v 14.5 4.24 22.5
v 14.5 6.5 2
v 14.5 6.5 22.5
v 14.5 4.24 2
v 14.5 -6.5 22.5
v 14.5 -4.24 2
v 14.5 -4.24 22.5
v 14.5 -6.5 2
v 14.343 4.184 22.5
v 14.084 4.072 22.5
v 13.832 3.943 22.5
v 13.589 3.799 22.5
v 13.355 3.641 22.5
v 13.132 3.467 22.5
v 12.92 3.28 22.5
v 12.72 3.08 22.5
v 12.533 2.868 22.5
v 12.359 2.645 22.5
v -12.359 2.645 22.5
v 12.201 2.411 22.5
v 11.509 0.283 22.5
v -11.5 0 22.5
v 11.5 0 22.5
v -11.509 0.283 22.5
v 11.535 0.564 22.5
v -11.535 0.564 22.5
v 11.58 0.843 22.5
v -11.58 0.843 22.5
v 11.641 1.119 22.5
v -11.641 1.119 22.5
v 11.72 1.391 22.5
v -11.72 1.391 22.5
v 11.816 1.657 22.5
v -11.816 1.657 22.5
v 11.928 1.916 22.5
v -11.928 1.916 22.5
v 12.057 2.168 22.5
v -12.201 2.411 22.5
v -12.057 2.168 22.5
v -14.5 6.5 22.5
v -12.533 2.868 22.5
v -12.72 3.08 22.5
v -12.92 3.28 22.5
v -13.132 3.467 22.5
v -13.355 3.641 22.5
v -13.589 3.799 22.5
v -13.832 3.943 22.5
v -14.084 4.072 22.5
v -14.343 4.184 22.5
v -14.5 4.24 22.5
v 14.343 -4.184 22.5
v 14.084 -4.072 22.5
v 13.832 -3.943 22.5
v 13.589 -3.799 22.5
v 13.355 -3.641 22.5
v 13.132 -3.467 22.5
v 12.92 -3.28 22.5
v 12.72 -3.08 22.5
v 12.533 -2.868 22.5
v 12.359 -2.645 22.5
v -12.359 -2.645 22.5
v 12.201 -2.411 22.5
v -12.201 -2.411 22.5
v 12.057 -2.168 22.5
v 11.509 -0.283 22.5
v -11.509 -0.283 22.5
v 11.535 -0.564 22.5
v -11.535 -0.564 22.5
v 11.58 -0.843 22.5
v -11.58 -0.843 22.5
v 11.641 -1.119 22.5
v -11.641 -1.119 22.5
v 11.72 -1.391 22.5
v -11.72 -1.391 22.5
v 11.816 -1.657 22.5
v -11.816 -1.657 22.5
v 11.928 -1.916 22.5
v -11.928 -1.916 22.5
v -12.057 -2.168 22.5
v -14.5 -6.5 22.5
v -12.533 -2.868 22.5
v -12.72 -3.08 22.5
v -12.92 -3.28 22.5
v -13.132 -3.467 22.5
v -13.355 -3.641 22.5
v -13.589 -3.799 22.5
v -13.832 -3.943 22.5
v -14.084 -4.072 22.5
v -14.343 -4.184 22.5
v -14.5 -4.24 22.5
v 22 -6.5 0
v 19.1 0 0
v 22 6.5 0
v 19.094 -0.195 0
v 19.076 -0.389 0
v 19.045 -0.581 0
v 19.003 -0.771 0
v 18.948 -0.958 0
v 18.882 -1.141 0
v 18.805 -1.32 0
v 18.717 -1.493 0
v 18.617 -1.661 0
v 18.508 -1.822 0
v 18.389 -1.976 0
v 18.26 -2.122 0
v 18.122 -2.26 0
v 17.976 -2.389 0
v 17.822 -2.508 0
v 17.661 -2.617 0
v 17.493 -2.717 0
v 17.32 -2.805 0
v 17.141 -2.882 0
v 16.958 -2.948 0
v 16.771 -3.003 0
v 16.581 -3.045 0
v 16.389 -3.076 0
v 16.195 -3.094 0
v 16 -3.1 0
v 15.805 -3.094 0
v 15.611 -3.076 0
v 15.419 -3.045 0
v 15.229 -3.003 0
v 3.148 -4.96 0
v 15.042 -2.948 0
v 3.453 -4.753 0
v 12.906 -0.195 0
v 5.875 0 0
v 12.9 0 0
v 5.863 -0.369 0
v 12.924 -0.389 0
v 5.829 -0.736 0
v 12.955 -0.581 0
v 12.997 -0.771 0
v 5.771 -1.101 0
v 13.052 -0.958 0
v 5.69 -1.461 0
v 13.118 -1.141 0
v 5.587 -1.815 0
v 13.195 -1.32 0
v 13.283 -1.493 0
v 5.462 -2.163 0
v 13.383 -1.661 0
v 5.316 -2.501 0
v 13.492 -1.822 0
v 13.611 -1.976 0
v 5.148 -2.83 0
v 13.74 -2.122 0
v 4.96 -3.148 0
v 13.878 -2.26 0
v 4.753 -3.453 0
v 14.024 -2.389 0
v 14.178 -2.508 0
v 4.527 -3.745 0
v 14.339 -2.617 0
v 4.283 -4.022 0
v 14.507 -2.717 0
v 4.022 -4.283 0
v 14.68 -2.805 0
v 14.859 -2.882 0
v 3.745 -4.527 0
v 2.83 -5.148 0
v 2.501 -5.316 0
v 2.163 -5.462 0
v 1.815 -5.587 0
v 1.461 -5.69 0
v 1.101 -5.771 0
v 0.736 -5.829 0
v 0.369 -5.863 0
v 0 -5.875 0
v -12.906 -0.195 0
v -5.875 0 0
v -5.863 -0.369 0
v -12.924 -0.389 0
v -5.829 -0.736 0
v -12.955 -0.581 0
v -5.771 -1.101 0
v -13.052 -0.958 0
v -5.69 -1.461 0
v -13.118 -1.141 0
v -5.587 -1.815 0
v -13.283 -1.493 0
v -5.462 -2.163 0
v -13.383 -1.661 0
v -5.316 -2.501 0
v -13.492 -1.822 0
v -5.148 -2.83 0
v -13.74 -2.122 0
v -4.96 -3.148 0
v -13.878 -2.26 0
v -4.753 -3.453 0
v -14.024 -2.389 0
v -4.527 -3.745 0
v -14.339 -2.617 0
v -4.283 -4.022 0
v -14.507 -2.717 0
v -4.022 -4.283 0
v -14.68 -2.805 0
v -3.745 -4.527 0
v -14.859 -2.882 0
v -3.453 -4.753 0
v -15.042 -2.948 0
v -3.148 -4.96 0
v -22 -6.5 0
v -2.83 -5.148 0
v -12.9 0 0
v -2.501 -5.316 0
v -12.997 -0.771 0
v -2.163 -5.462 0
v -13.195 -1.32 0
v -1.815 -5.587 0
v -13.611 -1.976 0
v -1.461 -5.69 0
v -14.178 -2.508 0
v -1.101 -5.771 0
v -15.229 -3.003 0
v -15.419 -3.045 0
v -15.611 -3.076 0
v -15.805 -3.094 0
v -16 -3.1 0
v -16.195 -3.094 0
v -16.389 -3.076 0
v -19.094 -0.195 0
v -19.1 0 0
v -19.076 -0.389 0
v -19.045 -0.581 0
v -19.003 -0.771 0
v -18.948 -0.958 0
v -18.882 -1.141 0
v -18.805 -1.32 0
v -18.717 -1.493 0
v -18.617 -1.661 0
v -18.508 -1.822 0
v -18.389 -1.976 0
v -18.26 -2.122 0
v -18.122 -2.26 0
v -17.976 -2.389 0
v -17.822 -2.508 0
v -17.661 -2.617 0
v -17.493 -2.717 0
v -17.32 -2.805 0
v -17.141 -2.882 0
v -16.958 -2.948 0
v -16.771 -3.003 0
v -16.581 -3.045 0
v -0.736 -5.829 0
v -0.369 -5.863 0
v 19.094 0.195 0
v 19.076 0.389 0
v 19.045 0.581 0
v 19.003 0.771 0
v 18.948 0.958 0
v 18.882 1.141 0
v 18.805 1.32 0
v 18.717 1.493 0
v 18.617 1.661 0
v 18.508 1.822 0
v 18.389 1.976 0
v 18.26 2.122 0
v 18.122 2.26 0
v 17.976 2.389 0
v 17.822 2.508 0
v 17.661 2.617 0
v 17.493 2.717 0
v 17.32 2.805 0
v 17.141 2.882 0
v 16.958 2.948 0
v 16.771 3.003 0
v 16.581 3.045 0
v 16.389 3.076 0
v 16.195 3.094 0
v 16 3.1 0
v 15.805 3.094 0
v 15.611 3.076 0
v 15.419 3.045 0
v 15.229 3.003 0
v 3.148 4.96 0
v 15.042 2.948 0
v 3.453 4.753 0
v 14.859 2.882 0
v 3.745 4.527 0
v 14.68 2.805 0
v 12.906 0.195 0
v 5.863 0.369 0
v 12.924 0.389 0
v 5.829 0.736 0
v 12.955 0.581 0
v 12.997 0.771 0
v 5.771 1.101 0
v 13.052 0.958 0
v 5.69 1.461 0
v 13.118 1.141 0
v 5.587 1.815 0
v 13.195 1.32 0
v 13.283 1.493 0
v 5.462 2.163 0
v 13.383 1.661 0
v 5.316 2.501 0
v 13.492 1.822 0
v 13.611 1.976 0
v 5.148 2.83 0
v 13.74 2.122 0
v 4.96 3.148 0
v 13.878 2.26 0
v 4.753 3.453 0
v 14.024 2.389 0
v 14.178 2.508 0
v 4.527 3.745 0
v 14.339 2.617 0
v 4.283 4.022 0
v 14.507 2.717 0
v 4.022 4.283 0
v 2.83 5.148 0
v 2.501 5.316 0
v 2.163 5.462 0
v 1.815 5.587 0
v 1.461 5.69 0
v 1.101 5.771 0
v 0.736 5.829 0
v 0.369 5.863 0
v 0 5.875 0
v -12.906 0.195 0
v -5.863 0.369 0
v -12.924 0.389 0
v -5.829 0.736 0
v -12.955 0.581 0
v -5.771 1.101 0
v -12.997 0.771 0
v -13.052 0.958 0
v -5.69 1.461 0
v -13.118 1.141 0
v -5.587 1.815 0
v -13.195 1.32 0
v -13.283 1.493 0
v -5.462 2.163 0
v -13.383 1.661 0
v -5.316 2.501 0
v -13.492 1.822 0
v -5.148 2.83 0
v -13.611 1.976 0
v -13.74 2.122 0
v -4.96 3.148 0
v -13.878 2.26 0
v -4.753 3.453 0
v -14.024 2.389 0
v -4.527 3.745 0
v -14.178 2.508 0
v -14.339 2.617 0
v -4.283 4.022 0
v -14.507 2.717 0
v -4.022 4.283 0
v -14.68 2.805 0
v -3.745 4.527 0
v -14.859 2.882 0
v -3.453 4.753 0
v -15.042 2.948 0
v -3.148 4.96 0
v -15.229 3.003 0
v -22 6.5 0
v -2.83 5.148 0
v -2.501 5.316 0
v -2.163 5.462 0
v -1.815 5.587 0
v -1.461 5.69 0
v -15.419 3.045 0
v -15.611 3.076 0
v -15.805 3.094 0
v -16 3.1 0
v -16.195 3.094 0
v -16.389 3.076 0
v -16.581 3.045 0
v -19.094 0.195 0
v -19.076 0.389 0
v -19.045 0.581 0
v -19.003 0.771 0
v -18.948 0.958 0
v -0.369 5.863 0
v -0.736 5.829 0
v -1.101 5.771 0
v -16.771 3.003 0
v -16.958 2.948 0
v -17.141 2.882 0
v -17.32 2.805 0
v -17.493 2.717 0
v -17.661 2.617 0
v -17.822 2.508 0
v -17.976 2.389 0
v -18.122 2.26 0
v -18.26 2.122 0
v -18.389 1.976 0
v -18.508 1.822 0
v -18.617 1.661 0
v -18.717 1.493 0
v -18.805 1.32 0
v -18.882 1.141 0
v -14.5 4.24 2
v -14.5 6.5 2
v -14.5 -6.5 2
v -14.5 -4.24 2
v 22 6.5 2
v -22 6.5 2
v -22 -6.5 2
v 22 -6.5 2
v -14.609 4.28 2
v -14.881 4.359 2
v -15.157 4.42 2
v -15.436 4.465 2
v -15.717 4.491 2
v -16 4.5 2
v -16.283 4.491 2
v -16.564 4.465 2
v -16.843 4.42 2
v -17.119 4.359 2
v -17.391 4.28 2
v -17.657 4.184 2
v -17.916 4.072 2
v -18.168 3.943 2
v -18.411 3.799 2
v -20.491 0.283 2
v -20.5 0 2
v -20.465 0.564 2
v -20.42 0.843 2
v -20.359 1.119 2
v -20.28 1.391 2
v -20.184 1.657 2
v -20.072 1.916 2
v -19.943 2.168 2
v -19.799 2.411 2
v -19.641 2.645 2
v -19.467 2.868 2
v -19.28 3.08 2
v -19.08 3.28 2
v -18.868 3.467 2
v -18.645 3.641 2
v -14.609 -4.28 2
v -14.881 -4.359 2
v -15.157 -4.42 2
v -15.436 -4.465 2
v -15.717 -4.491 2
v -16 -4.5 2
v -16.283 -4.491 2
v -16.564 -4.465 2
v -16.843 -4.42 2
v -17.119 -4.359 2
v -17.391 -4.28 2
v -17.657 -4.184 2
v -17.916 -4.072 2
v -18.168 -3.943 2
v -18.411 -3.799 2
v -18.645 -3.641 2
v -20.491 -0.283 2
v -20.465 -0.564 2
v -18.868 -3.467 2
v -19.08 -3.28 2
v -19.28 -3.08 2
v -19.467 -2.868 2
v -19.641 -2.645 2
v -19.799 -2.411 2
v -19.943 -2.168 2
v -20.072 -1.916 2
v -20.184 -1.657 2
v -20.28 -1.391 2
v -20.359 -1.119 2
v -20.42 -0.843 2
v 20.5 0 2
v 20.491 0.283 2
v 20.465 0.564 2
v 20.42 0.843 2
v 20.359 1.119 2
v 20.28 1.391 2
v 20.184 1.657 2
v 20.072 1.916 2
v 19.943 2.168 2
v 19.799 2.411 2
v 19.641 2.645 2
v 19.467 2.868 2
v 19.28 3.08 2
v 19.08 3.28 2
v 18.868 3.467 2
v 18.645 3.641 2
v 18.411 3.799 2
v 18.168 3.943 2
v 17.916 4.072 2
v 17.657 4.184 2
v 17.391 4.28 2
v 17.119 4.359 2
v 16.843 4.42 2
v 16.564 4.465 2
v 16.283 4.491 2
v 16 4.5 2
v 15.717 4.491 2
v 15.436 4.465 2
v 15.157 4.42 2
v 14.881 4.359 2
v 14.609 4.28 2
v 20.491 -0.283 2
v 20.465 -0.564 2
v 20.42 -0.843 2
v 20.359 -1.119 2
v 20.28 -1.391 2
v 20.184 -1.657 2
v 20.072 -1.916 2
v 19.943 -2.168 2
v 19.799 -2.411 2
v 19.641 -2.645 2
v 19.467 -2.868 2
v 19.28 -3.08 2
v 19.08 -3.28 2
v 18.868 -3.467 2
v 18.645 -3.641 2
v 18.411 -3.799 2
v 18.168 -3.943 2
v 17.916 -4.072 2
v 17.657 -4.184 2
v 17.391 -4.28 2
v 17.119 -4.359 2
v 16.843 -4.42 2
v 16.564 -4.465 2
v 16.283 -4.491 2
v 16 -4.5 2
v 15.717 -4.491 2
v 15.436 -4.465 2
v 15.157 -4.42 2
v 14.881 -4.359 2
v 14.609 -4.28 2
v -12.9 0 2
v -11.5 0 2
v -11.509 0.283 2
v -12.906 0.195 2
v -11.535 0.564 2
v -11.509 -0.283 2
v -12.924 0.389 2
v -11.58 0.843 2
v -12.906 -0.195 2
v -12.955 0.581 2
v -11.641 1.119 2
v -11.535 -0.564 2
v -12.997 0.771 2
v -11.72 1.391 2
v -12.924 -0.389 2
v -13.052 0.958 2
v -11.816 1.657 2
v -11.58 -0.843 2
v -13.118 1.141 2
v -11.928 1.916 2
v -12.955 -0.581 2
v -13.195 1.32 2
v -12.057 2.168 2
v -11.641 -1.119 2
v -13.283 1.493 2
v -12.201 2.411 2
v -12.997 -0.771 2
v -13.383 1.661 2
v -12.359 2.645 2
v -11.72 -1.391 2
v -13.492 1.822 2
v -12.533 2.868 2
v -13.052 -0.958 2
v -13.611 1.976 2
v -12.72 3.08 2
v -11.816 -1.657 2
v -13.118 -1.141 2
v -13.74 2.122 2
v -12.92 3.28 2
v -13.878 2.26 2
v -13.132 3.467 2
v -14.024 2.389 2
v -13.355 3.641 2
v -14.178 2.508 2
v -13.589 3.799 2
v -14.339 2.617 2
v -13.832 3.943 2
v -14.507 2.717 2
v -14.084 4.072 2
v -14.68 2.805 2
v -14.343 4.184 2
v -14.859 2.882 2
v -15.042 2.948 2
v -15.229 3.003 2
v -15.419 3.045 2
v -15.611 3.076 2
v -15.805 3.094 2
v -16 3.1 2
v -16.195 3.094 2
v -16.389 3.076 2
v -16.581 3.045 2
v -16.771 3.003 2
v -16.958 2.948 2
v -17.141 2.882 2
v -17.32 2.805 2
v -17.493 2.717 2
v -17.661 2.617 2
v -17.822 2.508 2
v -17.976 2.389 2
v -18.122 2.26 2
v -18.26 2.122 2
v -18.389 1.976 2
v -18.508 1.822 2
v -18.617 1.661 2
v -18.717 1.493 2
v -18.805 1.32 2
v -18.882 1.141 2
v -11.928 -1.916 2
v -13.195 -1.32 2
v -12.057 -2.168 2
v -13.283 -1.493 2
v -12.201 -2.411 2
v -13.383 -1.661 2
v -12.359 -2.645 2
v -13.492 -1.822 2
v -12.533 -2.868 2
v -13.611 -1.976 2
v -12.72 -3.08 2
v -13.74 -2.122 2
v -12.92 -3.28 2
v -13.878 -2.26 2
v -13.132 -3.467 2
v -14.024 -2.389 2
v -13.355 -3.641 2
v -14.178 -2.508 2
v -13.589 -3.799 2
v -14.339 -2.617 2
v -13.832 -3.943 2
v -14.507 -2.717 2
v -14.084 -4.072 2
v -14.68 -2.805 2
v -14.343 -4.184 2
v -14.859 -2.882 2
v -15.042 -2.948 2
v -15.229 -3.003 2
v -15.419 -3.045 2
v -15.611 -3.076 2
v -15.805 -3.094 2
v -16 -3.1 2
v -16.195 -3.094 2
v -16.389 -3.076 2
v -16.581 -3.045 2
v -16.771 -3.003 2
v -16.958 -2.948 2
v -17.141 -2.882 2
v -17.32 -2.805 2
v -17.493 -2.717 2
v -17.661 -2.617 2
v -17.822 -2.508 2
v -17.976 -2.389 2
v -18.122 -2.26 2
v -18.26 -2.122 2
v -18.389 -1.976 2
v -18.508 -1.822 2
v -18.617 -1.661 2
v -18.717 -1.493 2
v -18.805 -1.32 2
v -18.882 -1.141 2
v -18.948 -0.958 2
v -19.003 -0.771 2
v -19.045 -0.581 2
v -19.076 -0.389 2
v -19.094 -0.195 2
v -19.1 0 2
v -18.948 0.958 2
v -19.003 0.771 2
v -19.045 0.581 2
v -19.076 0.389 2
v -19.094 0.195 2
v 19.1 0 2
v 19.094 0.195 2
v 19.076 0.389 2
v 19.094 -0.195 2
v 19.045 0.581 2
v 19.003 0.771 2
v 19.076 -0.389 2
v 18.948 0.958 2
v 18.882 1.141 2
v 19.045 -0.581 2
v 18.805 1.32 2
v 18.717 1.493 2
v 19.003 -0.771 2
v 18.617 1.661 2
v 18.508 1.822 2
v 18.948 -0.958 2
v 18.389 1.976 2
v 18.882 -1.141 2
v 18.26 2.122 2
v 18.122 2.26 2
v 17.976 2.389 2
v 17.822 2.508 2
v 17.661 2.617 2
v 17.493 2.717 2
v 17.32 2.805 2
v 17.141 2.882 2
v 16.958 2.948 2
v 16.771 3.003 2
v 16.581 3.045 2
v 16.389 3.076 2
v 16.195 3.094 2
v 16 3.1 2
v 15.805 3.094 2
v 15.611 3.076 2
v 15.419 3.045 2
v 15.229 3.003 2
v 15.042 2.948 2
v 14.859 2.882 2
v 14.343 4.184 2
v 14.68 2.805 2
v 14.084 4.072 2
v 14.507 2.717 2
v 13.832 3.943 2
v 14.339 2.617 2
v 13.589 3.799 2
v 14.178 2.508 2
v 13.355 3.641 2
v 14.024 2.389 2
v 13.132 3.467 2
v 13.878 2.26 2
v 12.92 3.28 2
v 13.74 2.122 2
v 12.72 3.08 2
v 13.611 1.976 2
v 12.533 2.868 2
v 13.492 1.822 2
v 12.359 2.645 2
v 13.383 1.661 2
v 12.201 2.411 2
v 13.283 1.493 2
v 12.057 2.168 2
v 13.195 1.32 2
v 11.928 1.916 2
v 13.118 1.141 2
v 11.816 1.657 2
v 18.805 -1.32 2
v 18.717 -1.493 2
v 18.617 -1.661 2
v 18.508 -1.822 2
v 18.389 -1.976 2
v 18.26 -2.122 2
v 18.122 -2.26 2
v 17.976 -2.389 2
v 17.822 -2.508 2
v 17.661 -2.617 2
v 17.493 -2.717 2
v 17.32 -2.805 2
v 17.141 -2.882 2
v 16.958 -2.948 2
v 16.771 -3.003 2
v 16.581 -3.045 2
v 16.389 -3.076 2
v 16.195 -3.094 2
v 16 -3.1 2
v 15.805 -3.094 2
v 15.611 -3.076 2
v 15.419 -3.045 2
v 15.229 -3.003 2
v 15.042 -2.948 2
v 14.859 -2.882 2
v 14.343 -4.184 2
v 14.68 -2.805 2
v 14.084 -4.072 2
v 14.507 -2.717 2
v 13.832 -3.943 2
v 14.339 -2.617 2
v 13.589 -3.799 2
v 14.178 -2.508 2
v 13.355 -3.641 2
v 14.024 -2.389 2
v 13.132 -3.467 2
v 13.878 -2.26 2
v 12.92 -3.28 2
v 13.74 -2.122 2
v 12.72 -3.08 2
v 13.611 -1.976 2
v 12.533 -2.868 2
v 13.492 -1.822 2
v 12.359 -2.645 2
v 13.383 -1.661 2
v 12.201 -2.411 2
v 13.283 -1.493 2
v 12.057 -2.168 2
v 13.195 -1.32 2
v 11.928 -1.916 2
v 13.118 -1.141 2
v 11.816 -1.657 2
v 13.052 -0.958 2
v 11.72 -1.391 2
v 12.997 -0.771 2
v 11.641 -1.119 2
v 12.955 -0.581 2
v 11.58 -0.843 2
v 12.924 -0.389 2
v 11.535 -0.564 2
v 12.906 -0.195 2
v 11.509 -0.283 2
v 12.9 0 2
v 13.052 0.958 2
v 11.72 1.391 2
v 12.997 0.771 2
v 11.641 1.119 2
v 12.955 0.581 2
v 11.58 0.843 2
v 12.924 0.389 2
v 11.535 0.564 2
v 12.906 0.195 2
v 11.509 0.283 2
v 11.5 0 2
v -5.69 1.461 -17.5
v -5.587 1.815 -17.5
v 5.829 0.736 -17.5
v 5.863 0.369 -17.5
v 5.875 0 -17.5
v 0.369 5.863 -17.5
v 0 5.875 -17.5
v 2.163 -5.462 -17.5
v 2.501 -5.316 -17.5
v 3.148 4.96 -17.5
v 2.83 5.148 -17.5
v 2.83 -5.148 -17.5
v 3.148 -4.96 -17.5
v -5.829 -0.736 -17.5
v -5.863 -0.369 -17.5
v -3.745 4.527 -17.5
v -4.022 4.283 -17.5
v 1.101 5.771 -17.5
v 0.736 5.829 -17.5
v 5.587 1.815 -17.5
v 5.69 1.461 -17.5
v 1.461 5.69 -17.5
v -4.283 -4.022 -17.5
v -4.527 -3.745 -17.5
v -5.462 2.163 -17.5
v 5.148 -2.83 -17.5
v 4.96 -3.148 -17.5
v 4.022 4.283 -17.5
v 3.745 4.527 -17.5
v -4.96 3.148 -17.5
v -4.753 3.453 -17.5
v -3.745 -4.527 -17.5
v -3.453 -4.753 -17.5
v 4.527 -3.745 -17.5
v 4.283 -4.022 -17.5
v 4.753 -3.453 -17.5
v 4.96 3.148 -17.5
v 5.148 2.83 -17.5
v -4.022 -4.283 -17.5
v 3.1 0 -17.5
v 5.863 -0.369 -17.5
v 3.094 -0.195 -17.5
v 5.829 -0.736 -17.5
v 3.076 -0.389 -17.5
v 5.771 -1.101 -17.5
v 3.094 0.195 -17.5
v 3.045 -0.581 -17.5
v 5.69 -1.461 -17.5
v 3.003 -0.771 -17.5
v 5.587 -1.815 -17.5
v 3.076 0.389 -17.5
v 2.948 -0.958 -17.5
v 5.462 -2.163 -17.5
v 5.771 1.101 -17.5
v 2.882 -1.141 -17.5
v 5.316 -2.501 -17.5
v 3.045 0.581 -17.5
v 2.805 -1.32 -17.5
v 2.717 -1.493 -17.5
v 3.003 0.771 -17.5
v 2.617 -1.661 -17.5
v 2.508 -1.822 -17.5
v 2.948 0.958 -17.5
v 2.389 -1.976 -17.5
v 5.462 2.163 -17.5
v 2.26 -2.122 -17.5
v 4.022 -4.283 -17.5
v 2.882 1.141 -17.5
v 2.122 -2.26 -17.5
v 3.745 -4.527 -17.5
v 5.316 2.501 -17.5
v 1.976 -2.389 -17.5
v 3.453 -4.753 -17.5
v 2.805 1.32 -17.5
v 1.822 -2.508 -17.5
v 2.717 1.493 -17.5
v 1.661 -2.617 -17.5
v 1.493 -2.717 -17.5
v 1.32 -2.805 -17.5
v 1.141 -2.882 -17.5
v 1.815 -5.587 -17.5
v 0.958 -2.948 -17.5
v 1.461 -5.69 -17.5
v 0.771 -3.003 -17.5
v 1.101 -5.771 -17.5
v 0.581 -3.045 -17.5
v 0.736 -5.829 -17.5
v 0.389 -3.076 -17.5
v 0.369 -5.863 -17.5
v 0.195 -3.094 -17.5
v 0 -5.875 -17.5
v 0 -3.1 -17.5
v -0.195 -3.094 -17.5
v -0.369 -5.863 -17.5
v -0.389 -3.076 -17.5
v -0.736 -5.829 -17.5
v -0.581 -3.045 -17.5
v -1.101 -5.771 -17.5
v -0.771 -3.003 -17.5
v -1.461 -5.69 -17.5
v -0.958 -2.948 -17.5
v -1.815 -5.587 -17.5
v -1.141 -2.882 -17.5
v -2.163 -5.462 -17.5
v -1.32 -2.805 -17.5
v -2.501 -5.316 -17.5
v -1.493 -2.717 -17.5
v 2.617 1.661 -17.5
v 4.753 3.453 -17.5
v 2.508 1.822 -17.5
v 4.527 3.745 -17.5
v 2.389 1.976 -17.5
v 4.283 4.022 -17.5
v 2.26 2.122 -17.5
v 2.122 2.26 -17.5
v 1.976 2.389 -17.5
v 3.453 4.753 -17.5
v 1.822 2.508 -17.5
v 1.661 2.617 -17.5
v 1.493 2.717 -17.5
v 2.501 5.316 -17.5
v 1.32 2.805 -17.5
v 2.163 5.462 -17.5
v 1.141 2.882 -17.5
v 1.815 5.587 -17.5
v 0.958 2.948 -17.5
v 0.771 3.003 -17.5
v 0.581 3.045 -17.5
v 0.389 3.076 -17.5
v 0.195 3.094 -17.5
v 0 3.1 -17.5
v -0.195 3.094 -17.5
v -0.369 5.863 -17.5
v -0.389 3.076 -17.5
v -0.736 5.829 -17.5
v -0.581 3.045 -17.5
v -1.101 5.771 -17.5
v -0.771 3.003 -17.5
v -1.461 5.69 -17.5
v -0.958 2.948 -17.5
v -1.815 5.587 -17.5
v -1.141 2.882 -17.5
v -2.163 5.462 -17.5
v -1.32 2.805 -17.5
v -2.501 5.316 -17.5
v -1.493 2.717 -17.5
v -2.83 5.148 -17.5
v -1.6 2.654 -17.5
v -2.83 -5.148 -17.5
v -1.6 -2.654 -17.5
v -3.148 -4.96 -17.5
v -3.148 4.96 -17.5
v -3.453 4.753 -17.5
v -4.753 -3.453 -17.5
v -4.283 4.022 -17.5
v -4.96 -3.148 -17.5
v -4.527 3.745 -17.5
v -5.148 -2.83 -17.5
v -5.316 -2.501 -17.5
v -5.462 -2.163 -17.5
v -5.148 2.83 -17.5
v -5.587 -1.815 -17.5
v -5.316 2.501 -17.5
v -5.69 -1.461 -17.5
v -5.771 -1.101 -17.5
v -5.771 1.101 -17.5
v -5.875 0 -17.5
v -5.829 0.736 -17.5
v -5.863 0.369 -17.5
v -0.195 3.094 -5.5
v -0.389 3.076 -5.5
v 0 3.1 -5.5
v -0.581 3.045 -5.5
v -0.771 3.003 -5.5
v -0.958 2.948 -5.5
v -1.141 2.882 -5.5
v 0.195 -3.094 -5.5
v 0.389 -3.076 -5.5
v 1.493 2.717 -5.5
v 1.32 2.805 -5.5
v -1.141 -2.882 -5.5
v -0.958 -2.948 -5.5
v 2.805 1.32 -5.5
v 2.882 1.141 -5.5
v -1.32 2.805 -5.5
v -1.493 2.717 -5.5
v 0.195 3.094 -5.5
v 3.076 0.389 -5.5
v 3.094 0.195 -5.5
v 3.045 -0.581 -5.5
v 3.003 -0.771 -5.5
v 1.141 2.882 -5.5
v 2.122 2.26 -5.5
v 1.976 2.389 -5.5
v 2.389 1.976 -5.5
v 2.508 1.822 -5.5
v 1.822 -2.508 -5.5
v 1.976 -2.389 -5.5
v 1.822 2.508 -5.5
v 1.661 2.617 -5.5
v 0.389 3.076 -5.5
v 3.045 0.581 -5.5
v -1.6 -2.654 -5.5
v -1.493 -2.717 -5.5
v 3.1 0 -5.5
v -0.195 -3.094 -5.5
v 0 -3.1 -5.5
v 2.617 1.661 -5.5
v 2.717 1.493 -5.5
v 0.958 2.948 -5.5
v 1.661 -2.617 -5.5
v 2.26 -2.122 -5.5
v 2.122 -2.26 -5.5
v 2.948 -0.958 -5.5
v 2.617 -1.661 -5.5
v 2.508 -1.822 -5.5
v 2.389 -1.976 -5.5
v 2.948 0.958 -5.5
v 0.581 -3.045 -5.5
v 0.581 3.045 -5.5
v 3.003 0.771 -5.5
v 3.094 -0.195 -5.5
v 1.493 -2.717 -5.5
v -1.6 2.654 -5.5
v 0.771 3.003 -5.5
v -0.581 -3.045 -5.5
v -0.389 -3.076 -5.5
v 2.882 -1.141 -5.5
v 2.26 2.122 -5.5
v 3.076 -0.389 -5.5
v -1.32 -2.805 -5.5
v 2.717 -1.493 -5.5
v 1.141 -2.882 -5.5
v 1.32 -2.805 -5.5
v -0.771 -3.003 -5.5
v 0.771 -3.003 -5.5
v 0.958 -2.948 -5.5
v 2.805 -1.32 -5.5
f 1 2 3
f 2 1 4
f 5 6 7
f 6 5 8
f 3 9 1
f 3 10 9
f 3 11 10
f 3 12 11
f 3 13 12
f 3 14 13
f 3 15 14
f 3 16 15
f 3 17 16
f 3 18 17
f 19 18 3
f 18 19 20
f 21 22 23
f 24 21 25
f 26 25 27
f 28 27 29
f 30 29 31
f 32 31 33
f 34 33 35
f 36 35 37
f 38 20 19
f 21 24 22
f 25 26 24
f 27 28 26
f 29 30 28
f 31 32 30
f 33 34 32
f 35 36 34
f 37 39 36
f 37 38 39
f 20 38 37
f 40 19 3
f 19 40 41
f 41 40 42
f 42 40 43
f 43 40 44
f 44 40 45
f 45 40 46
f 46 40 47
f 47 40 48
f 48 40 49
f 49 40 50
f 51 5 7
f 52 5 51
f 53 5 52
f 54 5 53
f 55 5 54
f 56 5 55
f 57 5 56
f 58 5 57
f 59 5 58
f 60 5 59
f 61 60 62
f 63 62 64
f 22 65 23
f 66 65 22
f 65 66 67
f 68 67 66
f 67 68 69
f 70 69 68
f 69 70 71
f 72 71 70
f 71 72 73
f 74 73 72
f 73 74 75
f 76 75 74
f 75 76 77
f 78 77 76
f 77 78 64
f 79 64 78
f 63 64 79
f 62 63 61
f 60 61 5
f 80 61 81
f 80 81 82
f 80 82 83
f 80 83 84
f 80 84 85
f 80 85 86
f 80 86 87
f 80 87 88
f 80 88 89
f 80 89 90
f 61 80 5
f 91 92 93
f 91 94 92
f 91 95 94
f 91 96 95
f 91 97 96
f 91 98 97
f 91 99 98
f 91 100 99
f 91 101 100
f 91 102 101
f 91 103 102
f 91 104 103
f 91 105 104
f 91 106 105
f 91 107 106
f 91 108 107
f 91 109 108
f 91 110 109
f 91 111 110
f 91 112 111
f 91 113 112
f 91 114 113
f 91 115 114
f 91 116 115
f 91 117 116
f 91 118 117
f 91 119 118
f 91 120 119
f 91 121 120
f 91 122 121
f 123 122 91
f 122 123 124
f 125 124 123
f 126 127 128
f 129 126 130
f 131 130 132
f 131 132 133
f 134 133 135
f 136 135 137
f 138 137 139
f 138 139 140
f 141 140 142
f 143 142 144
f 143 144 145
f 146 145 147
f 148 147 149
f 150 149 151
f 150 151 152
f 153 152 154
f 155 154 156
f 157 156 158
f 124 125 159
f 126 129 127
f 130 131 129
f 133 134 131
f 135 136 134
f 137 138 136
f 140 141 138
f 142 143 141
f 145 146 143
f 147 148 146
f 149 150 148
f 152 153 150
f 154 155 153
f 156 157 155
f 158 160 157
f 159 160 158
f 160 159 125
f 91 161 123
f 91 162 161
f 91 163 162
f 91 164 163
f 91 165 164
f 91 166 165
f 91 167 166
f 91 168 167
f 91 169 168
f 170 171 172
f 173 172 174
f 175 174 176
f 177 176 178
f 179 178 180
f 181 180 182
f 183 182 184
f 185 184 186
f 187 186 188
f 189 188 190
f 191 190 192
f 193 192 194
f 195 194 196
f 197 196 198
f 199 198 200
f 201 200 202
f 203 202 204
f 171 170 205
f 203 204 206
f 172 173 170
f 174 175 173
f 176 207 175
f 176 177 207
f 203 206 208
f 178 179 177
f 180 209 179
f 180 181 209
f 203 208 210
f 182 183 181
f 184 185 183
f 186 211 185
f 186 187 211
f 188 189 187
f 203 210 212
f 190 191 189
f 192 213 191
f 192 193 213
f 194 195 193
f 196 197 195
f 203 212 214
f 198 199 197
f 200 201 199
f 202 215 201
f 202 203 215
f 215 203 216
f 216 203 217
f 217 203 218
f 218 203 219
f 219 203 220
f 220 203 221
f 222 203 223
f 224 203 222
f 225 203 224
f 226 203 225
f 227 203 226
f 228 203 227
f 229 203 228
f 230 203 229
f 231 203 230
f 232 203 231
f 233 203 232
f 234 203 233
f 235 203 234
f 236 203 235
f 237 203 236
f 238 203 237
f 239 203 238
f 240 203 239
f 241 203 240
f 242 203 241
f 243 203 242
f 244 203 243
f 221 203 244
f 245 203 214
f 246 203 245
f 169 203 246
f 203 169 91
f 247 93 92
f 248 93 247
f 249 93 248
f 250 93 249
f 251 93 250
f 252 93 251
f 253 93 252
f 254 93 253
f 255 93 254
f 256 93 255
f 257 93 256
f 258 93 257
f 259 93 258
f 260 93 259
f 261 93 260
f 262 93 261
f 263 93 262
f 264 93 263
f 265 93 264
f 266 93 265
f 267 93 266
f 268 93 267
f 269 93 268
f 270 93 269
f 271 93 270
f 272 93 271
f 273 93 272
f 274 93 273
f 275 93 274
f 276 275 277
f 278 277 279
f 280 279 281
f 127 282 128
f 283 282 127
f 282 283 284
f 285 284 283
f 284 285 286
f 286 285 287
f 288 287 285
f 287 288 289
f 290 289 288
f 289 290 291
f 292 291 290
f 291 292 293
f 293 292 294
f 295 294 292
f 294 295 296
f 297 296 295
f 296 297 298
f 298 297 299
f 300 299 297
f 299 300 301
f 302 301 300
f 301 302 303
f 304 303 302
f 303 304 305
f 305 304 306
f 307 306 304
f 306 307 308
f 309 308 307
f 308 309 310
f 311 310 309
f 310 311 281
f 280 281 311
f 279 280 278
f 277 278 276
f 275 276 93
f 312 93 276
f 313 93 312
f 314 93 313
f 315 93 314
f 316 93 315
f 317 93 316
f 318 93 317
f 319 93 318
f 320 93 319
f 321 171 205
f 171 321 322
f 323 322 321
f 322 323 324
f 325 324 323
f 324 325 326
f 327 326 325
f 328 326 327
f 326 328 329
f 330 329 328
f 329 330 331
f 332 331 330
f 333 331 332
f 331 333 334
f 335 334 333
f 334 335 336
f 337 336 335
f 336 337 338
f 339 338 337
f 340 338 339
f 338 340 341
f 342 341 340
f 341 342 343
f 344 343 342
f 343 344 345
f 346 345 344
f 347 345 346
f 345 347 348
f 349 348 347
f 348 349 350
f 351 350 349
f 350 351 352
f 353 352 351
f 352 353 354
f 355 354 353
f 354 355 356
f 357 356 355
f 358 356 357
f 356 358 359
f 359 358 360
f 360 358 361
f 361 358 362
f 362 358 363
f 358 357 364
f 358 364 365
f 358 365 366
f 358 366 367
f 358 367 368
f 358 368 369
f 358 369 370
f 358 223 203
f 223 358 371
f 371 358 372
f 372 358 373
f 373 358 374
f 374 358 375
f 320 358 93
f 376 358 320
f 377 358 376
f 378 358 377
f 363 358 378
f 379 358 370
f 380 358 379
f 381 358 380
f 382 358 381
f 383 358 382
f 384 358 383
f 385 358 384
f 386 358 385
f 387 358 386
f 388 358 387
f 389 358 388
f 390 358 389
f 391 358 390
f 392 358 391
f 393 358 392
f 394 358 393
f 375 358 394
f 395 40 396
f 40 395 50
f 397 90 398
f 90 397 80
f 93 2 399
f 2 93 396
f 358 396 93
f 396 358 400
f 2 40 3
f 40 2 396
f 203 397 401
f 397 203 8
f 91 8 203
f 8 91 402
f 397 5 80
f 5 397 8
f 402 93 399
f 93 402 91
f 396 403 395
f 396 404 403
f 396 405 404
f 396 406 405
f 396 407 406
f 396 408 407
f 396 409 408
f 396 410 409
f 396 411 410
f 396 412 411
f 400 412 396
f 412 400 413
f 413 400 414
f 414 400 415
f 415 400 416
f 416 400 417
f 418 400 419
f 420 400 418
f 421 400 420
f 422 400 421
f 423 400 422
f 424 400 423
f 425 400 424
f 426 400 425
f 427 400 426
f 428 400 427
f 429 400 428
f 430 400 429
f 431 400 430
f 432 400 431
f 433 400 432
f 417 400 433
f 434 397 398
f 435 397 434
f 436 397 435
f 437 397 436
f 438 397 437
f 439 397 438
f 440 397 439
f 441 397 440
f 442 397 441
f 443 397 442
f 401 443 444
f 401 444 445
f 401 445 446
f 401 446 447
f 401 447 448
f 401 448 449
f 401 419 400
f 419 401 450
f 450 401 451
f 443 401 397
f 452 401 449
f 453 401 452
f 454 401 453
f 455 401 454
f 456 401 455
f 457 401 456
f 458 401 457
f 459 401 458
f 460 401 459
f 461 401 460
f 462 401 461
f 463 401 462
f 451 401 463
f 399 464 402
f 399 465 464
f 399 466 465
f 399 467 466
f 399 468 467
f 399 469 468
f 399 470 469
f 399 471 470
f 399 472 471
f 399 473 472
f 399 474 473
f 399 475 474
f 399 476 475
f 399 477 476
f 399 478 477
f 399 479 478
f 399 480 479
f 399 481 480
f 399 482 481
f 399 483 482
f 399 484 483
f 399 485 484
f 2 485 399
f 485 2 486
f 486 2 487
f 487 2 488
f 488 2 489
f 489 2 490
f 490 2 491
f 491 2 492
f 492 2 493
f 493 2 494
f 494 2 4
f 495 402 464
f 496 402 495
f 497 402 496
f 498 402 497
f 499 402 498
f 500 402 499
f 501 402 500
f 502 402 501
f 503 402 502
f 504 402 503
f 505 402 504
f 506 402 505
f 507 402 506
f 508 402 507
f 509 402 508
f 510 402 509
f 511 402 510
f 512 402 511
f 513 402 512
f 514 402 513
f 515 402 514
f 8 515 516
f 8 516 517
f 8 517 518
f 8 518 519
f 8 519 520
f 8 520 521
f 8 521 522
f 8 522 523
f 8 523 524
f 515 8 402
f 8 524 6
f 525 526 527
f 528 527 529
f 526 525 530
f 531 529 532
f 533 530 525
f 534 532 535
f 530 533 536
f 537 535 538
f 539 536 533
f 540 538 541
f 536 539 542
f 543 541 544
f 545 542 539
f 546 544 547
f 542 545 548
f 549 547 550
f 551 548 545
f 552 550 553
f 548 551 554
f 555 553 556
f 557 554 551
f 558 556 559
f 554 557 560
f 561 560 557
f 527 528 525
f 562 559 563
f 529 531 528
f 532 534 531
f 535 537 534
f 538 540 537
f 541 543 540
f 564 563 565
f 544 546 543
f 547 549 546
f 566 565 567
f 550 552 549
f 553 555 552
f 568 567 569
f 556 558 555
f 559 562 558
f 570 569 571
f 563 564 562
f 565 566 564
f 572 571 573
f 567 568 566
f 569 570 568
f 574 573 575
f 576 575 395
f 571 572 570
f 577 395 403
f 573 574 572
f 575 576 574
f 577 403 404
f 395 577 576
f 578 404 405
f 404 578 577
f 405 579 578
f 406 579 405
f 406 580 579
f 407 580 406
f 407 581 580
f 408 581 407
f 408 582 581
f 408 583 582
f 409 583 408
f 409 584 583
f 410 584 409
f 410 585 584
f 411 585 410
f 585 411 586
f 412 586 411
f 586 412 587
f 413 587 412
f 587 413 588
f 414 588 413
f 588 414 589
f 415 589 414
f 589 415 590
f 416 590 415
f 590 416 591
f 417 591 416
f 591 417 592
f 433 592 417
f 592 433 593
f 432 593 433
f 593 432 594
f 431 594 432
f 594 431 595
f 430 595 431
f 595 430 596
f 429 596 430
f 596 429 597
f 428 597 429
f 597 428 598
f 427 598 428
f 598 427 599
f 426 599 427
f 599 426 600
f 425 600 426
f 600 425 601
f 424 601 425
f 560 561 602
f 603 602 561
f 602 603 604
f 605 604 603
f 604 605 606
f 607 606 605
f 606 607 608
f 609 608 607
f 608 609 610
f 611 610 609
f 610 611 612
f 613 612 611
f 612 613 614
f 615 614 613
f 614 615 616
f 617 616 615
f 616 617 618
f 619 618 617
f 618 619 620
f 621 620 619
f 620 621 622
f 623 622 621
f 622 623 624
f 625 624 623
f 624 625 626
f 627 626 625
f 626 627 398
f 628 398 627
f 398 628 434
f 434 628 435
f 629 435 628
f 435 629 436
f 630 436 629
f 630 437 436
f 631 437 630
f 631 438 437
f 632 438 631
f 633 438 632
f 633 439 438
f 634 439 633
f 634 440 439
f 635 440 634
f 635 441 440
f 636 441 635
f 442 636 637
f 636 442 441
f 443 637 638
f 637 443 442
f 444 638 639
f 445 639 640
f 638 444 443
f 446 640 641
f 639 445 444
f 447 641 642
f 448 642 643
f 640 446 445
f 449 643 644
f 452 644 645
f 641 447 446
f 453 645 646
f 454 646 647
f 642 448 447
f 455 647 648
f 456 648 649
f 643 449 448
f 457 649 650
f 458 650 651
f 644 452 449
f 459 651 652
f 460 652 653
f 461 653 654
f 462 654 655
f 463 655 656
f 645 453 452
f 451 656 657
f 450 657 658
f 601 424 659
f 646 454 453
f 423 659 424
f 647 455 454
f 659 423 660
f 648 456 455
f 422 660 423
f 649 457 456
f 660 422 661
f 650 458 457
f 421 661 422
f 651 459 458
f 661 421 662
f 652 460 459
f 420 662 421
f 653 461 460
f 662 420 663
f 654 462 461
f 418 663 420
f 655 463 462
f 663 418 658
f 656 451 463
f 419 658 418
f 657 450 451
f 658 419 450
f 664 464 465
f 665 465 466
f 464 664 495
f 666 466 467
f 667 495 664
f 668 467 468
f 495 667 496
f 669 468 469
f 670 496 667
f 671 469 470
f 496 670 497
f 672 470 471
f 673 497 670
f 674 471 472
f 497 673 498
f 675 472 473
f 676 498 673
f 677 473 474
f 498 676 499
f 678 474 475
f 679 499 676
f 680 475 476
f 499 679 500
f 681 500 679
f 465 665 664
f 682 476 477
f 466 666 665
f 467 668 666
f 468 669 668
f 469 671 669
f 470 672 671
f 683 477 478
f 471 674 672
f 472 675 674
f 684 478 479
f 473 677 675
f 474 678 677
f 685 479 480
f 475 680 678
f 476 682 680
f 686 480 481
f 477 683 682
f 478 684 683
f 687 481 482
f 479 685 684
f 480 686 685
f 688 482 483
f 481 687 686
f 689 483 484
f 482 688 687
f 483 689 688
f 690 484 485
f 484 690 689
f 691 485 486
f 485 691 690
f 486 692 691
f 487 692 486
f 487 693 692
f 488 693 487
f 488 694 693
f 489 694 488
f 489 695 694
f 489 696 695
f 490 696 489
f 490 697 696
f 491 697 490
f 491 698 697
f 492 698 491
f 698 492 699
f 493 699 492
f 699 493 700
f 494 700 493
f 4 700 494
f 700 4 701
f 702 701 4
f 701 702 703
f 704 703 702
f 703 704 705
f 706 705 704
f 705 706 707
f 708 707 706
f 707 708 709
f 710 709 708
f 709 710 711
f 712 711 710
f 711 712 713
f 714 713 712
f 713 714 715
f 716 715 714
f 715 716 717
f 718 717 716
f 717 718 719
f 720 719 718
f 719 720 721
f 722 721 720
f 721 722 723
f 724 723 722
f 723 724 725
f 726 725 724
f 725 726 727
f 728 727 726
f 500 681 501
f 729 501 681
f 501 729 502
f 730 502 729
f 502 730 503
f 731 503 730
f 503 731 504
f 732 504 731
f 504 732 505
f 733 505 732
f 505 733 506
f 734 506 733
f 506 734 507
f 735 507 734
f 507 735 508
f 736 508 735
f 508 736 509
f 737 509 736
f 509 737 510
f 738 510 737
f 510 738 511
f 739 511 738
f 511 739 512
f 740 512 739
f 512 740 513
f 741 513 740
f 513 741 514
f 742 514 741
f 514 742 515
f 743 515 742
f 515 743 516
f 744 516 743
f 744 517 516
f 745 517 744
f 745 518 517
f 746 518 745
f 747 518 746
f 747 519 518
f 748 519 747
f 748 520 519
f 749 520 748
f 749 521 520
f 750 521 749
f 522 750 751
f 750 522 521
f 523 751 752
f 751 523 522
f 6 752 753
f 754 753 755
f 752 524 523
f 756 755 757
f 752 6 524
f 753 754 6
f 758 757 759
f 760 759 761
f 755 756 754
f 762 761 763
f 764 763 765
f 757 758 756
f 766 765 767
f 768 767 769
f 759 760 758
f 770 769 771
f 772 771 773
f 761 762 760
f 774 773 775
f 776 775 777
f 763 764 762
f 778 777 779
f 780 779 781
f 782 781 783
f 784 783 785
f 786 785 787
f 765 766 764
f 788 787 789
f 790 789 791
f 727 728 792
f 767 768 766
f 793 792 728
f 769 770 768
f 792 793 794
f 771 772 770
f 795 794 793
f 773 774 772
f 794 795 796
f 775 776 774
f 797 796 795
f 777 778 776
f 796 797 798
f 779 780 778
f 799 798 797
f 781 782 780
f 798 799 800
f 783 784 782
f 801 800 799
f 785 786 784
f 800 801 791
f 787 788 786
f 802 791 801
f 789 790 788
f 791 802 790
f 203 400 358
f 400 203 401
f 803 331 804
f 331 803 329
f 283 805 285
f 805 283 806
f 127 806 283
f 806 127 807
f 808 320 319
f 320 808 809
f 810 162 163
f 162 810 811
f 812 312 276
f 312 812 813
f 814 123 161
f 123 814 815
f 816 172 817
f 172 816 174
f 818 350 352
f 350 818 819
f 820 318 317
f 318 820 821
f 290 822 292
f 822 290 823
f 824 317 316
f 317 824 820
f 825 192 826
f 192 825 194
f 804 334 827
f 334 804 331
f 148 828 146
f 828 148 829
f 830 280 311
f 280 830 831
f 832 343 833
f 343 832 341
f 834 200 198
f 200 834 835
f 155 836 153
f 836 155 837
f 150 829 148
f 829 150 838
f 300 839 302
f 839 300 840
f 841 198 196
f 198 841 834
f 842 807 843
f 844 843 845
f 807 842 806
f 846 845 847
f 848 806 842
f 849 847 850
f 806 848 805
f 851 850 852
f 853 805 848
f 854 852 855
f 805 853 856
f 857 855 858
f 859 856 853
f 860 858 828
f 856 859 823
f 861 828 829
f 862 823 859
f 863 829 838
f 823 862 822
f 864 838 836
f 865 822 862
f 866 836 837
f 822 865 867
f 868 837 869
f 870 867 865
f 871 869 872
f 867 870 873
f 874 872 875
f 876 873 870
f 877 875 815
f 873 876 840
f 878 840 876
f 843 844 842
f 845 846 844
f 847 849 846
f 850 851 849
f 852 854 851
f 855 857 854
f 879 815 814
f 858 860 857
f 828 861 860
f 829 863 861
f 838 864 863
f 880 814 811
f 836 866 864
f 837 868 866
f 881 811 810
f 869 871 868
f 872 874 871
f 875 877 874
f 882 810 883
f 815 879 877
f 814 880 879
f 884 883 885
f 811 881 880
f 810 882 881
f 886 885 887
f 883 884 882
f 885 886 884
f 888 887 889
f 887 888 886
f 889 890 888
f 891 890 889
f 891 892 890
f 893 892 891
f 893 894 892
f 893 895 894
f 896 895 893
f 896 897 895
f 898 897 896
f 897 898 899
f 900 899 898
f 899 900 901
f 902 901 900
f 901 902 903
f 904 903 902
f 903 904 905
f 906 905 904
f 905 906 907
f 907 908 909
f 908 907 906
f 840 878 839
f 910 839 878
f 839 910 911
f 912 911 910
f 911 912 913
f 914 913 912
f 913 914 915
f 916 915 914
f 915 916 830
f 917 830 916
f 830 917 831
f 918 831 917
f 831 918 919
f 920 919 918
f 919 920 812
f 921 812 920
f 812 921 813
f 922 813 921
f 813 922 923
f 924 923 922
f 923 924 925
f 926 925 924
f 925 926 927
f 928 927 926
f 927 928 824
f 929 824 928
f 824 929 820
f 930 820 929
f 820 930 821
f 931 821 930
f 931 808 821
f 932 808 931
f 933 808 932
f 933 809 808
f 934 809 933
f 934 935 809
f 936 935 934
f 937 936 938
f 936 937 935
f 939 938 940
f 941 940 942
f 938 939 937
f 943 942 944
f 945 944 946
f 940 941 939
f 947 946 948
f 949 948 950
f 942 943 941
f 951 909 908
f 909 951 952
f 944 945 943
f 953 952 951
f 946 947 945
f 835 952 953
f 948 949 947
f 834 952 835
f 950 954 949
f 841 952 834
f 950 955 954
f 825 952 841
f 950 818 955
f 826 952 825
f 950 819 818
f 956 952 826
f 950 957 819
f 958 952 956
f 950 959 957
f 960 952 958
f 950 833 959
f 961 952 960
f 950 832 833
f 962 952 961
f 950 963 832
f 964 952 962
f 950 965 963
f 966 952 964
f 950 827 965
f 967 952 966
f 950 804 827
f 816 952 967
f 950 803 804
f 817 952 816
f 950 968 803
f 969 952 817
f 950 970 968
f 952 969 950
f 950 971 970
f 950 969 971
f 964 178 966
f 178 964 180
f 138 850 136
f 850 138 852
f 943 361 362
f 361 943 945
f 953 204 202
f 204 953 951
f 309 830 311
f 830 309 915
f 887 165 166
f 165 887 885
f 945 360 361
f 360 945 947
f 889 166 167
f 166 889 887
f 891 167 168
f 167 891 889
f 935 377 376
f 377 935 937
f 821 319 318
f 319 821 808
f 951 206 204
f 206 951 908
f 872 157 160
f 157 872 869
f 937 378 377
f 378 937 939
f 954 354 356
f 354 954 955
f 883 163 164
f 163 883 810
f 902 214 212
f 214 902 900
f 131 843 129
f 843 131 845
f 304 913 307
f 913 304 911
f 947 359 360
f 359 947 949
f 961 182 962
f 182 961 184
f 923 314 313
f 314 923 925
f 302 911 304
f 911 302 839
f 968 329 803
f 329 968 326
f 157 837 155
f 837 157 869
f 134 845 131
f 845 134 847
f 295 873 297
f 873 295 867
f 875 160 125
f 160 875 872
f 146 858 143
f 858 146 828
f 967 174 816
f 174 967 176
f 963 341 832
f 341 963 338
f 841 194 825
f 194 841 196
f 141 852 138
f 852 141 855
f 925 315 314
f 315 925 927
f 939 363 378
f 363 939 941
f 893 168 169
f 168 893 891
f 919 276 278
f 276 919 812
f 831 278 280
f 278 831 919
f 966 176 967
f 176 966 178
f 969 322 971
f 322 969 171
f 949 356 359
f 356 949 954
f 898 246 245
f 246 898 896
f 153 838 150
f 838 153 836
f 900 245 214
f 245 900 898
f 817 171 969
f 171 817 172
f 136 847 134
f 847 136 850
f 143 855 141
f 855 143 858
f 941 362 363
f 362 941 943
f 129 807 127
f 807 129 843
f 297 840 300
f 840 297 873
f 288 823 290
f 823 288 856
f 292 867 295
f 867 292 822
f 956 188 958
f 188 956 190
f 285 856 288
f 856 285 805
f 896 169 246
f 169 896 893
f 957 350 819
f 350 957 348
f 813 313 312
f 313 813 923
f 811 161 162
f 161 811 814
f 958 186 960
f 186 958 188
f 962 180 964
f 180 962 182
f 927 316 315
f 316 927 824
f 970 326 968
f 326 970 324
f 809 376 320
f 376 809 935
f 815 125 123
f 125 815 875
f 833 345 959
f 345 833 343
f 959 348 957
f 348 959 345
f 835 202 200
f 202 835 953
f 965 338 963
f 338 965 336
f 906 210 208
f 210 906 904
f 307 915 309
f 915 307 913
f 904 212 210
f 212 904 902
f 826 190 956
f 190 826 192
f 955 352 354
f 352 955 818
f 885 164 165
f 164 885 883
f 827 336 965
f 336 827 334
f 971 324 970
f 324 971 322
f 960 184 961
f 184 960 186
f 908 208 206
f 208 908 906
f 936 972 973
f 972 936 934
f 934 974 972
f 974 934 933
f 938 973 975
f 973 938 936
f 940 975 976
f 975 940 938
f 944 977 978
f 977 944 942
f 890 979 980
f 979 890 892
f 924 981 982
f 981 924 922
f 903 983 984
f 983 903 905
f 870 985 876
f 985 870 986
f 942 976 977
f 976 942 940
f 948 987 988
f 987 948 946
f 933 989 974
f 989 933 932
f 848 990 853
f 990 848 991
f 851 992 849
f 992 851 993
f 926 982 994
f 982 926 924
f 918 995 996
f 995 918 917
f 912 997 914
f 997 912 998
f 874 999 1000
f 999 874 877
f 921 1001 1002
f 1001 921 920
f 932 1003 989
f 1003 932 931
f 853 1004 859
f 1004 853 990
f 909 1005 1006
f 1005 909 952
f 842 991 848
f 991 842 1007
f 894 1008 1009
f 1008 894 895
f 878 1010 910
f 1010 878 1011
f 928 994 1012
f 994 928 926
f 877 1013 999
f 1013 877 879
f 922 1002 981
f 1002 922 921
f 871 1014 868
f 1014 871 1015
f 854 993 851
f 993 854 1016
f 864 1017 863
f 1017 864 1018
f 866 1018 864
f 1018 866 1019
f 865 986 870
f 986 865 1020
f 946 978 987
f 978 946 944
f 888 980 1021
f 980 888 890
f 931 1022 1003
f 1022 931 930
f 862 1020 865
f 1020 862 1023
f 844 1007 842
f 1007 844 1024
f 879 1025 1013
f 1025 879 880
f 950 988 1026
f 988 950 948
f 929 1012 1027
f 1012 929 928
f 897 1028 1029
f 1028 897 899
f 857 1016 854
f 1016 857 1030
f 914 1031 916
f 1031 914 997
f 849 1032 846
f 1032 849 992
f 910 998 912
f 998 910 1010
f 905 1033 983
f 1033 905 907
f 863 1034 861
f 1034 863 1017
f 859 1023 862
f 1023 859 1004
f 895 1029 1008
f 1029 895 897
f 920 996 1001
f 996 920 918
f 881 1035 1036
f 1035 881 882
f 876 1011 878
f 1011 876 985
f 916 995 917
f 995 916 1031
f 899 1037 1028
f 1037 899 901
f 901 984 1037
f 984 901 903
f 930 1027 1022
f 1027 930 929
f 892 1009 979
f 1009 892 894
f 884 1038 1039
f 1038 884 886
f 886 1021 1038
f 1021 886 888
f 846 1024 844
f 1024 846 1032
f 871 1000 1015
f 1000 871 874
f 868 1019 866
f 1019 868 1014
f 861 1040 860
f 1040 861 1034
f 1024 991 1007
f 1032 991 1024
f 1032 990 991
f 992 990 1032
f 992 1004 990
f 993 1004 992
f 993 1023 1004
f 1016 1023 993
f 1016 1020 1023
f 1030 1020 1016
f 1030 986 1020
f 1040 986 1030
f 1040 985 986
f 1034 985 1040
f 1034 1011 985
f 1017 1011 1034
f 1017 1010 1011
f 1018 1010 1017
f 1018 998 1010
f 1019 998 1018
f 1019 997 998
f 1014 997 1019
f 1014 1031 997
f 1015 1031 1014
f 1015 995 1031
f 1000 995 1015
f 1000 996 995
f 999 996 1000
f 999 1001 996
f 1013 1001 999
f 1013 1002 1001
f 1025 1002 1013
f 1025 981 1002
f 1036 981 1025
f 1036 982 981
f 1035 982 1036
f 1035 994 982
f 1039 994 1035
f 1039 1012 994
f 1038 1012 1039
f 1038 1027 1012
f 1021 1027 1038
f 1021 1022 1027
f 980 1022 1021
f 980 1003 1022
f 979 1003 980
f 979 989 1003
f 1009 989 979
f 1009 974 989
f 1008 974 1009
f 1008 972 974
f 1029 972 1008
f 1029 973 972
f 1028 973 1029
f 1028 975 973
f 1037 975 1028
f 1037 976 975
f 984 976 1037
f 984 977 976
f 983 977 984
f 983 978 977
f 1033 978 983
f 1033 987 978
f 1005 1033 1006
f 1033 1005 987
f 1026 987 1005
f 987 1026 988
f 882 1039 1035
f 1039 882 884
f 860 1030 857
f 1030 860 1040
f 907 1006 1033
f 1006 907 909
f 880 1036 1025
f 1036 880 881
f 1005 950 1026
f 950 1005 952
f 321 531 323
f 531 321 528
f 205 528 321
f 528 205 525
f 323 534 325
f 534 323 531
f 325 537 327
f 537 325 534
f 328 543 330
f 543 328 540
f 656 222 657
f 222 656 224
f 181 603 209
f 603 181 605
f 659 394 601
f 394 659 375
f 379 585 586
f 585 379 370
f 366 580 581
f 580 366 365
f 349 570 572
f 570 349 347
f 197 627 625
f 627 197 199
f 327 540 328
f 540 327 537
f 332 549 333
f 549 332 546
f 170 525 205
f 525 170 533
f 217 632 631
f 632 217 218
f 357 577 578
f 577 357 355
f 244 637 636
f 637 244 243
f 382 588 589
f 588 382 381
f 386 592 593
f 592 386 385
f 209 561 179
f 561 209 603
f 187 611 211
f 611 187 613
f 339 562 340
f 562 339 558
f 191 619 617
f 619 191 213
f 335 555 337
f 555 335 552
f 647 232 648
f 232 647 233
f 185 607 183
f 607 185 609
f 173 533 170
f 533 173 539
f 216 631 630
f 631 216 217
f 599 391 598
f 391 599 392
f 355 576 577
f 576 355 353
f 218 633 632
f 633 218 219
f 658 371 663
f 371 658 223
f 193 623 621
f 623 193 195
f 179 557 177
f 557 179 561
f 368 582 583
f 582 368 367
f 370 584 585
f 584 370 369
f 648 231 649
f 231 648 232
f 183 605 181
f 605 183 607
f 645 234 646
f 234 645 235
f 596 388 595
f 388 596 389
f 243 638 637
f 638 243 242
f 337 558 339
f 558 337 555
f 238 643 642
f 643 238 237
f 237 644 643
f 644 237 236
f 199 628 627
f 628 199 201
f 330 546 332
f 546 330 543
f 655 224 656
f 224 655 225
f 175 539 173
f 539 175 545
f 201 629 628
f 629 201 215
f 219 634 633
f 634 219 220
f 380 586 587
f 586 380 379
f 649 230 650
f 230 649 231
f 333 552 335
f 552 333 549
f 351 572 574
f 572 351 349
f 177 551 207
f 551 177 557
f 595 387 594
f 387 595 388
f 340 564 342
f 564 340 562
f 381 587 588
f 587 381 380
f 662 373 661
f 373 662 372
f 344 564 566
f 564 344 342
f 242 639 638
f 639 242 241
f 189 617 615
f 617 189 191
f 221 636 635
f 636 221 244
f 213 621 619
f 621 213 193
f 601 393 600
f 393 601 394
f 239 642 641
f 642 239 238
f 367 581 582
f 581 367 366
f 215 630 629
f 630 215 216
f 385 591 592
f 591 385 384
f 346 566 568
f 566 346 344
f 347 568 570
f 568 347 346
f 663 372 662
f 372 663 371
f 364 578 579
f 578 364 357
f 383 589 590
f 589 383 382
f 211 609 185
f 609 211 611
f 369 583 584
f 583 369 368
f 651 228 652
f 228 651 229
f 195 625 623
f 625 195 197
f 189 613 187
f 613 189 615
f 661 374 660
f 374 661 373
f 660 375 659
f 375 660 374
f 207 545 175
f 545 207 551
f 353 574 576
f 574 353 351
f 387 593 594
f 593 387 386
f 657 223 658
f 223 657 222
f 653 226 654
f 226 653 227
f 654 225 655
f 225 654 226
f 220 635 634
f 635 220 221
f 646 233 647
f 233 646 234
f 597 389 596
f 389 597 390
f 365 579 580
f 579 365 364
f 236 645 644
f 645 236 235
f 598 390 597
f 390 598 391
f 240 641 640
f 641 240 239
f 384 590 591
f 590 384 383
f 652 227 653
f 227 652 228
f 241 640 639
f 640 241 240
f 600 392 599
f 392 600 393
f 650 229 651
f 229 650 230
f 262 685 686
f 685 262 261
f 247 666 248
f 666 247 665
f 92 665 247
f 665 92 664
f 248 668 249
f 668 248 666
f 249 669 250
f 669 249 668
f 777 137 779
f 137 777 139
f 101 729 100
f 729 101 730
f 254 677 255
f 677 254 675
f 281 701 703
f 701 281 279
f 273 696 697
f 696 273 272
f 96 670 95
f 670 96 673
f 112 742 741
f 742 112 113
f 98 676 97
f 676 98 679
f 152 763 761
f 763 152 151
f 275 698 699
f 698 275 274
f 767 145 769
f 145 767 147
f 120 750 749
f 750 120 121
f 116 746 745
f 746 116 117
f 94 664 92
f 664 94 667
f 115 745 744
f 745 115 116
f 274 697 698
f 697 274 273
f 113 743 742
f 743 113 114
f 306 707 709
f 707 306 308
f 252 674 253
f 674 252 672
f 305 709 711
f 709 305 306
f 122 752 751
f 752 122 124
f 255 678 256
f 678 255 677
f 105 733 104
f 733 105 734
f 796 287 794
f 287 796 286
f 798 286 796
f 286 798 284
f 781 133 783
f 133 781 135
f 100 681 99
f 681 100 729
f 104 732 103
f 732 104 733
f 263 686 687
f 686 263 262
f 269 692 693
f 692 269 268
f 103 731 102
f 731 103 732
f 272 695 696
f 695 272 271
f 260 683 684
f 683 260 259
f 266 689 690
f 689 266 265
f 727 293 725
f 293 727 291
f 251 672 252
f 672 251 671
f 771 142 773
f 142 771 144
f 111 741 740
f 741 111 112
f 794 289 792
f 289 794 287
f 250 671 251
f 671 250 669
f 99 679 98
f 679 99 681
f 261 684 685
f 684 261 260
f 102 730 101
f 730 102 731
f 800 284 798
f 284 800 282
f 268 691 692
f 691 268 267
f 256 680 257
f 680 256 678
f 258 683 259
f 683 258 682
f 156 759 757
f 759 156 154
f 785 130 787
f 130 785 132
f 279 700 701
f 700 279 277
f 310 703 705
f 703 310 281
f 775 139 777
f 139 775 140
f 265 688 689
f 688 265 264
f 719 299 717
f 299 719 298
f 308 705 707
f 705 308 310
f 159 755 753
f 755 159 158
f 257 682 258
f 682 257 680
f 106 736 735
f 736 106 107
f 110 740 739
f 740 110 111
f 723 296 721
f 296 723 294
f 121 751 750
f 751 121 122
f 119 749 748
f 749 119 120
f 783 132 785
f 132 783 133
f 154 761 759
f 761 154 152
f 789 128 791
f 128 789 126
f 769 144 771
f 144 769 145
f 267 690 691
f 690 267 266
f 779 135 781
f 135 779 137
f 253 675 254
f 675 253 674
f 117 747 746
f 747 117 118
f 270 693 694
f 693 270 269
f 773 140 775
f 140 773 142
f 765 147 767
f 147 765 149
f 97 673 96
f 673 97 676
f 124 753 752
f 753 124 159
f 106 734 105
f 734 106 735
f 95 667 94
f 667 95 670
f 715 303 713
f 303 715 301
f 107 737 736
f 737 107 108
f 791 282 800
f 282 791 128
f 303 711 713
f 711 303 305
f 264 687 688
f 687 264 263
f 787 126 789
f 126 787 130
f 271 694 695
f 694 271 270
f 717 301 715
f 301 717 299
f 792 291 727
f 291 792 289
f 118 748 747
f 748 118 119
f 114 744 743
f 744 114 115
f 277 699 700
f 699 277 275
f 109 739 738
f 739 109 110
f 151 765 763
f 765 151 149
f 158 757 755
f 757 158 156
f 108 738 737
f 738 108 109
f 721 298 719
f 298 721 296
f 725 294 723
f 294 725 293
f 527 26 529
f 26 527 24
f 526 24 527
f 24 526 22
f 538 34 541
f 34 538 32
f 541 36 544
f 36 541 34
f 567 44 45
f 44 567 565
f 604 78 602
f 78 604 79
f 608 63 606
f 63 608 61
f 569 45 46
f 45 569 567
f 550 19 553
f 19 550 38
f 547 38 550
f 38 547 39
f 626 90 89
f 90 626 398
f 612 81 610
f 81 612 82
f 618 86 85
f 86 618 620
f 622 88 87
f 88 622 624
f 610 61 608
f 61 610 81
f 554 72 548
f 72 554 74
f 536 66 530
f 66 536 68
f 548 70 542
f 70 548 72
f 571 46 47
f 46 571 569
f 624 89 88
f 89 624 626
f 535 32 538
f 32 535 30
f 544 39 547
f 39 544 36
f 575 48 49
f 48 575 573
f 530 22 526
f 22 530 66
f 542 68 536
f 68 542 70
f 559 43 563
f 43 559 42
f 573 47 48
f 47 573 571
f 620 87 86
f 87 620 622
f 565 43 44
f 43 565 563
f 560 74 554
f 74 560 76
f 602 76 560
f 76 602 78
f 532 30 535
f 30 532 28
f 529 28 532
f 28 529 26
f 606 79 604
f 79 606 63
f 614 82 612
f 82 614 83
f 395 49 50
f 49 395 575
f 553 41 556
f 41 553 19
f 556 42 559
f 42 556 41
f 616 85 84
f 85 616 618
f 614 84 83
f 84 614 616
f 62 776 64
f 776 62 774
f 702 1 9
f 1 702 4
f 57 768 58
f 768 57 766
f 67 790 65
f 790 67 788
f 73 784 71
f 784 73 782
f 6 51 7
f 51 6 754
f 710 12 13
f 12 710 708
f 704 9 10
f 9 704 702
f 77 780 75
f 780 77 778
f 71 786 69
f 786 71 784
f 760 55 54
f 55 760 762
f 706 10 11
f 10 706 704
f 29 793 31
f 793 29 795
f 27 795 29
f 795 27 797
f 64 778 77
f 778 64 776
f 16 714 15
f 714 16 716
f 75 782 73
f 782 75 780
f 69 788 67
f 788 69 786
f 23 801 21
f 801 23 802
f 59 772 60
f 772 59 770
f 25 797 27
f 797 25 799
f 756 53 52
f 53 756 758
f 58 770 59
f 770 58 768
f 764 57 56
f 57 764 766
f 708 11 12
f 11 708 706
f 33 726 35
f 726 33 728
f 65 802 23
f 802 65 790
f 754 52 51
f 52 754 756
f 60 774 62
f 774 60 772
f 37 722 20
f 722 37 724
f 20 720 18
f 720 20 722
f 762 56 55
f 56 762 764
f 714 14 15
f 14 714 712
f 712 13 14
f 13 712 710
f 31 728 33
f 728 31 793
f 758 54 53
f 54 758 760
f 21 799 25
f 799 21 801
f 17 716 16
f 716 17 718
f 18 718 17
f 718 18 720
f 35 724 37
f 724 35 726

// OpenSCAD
/*
Parametric LG Stove Knob Replacement
------------------------------------
A durable replacement block for LG oven/stove knobs. 

PRINT ORIENTATION IS CRITICAL: Lay the block completely flat on its side 
so the layer lines run longitudinally down the column. Do NOT print upright.
Use ABS, ASA, or PC (Do not use PLA or PETG for the main body).

Customizable Variables:
*/

$fn = 100;

// --- Block Body Dimensions ---
block_width = 29;    // Total length of the recessed block
block_depth = 13;    // Width of the block
block_height = 22.5; // Total depth including the ledge

// --- Mounting Flanges (Ledge) ---
flange_width = 44;   // Total tip-to-tip width across both ears
flange_thick = 2;    // Ledge thickness
screw_spacing = 32;  // Center-to-center distance of screw holes
screw_dia = 6.2;       // Diameter of the screw holes
post_clearance_dia = 9; // Diameter of the screw post clearance

// --- Extended Column ---
col_dia = 11.75;       // MUST clear the hole in the metal backplate
col_reach = 17.5;      // Extension distance to reach the stove peg

// --- D-Shaft Socket ---
d_dia = 6.2;         // Diameter of the stove's D-shaft
d_flat = 4.7;        // Distance from the flat edge to the round edge
d_depth = 12;        // Depth of the D-shaft hole
d_angle = 90;        // Rotation angle to align the flat side

difference() {
    // --- Solid Geometry ---
    union() {
        // Main solid body
        translate([-block_width/2, -block_depth/2, 0])
            cube([block_width, block_depth, block_height]);
        
        // Mounting flanges
        translate([-flange_width/2, -block_depth/2, 0])
            cube([flange_width, block_depth, flange_thick]);
            
        // Extended central column
        translate([0, 0, -col_reach])
            cylinder(d=col_dia, h=col_reach + 0.1);
    }
    
    // --- Subtractions ---
    // 1. Screw holes
    translate([-screw_spacing/2, 0, -1])
        cylinder(d=screw_dia, h=block_height + 2);
    translate([screw_spacing/2, 0, -1])
        cylinder(d=screw_dia, h=block_height + 2);
        
    // 2. Clearances for the outer shell's screw posts
    translate([-screw_spacing/2, 0, flange_thick])
        cylinder(d=post_clearance_dia, h=block_height);
    translate([screw_spacing/2, 0, flange_thick])
        cylinder(d=post_clearance_dia, h=block_height);
        
    // 3. D-Shaft Socket
    translate([0, 0, -col_reach - 1])
    rotate([0, 0, d_angle])
    difference() {
        cylinder(d=d_dia, h=d_depth + 1);
        translate([-d_dia/2, d_flat - (d_dia/2), -1])
            cube([d_dia, d_dia, d_depth + 3]);
    }
}
